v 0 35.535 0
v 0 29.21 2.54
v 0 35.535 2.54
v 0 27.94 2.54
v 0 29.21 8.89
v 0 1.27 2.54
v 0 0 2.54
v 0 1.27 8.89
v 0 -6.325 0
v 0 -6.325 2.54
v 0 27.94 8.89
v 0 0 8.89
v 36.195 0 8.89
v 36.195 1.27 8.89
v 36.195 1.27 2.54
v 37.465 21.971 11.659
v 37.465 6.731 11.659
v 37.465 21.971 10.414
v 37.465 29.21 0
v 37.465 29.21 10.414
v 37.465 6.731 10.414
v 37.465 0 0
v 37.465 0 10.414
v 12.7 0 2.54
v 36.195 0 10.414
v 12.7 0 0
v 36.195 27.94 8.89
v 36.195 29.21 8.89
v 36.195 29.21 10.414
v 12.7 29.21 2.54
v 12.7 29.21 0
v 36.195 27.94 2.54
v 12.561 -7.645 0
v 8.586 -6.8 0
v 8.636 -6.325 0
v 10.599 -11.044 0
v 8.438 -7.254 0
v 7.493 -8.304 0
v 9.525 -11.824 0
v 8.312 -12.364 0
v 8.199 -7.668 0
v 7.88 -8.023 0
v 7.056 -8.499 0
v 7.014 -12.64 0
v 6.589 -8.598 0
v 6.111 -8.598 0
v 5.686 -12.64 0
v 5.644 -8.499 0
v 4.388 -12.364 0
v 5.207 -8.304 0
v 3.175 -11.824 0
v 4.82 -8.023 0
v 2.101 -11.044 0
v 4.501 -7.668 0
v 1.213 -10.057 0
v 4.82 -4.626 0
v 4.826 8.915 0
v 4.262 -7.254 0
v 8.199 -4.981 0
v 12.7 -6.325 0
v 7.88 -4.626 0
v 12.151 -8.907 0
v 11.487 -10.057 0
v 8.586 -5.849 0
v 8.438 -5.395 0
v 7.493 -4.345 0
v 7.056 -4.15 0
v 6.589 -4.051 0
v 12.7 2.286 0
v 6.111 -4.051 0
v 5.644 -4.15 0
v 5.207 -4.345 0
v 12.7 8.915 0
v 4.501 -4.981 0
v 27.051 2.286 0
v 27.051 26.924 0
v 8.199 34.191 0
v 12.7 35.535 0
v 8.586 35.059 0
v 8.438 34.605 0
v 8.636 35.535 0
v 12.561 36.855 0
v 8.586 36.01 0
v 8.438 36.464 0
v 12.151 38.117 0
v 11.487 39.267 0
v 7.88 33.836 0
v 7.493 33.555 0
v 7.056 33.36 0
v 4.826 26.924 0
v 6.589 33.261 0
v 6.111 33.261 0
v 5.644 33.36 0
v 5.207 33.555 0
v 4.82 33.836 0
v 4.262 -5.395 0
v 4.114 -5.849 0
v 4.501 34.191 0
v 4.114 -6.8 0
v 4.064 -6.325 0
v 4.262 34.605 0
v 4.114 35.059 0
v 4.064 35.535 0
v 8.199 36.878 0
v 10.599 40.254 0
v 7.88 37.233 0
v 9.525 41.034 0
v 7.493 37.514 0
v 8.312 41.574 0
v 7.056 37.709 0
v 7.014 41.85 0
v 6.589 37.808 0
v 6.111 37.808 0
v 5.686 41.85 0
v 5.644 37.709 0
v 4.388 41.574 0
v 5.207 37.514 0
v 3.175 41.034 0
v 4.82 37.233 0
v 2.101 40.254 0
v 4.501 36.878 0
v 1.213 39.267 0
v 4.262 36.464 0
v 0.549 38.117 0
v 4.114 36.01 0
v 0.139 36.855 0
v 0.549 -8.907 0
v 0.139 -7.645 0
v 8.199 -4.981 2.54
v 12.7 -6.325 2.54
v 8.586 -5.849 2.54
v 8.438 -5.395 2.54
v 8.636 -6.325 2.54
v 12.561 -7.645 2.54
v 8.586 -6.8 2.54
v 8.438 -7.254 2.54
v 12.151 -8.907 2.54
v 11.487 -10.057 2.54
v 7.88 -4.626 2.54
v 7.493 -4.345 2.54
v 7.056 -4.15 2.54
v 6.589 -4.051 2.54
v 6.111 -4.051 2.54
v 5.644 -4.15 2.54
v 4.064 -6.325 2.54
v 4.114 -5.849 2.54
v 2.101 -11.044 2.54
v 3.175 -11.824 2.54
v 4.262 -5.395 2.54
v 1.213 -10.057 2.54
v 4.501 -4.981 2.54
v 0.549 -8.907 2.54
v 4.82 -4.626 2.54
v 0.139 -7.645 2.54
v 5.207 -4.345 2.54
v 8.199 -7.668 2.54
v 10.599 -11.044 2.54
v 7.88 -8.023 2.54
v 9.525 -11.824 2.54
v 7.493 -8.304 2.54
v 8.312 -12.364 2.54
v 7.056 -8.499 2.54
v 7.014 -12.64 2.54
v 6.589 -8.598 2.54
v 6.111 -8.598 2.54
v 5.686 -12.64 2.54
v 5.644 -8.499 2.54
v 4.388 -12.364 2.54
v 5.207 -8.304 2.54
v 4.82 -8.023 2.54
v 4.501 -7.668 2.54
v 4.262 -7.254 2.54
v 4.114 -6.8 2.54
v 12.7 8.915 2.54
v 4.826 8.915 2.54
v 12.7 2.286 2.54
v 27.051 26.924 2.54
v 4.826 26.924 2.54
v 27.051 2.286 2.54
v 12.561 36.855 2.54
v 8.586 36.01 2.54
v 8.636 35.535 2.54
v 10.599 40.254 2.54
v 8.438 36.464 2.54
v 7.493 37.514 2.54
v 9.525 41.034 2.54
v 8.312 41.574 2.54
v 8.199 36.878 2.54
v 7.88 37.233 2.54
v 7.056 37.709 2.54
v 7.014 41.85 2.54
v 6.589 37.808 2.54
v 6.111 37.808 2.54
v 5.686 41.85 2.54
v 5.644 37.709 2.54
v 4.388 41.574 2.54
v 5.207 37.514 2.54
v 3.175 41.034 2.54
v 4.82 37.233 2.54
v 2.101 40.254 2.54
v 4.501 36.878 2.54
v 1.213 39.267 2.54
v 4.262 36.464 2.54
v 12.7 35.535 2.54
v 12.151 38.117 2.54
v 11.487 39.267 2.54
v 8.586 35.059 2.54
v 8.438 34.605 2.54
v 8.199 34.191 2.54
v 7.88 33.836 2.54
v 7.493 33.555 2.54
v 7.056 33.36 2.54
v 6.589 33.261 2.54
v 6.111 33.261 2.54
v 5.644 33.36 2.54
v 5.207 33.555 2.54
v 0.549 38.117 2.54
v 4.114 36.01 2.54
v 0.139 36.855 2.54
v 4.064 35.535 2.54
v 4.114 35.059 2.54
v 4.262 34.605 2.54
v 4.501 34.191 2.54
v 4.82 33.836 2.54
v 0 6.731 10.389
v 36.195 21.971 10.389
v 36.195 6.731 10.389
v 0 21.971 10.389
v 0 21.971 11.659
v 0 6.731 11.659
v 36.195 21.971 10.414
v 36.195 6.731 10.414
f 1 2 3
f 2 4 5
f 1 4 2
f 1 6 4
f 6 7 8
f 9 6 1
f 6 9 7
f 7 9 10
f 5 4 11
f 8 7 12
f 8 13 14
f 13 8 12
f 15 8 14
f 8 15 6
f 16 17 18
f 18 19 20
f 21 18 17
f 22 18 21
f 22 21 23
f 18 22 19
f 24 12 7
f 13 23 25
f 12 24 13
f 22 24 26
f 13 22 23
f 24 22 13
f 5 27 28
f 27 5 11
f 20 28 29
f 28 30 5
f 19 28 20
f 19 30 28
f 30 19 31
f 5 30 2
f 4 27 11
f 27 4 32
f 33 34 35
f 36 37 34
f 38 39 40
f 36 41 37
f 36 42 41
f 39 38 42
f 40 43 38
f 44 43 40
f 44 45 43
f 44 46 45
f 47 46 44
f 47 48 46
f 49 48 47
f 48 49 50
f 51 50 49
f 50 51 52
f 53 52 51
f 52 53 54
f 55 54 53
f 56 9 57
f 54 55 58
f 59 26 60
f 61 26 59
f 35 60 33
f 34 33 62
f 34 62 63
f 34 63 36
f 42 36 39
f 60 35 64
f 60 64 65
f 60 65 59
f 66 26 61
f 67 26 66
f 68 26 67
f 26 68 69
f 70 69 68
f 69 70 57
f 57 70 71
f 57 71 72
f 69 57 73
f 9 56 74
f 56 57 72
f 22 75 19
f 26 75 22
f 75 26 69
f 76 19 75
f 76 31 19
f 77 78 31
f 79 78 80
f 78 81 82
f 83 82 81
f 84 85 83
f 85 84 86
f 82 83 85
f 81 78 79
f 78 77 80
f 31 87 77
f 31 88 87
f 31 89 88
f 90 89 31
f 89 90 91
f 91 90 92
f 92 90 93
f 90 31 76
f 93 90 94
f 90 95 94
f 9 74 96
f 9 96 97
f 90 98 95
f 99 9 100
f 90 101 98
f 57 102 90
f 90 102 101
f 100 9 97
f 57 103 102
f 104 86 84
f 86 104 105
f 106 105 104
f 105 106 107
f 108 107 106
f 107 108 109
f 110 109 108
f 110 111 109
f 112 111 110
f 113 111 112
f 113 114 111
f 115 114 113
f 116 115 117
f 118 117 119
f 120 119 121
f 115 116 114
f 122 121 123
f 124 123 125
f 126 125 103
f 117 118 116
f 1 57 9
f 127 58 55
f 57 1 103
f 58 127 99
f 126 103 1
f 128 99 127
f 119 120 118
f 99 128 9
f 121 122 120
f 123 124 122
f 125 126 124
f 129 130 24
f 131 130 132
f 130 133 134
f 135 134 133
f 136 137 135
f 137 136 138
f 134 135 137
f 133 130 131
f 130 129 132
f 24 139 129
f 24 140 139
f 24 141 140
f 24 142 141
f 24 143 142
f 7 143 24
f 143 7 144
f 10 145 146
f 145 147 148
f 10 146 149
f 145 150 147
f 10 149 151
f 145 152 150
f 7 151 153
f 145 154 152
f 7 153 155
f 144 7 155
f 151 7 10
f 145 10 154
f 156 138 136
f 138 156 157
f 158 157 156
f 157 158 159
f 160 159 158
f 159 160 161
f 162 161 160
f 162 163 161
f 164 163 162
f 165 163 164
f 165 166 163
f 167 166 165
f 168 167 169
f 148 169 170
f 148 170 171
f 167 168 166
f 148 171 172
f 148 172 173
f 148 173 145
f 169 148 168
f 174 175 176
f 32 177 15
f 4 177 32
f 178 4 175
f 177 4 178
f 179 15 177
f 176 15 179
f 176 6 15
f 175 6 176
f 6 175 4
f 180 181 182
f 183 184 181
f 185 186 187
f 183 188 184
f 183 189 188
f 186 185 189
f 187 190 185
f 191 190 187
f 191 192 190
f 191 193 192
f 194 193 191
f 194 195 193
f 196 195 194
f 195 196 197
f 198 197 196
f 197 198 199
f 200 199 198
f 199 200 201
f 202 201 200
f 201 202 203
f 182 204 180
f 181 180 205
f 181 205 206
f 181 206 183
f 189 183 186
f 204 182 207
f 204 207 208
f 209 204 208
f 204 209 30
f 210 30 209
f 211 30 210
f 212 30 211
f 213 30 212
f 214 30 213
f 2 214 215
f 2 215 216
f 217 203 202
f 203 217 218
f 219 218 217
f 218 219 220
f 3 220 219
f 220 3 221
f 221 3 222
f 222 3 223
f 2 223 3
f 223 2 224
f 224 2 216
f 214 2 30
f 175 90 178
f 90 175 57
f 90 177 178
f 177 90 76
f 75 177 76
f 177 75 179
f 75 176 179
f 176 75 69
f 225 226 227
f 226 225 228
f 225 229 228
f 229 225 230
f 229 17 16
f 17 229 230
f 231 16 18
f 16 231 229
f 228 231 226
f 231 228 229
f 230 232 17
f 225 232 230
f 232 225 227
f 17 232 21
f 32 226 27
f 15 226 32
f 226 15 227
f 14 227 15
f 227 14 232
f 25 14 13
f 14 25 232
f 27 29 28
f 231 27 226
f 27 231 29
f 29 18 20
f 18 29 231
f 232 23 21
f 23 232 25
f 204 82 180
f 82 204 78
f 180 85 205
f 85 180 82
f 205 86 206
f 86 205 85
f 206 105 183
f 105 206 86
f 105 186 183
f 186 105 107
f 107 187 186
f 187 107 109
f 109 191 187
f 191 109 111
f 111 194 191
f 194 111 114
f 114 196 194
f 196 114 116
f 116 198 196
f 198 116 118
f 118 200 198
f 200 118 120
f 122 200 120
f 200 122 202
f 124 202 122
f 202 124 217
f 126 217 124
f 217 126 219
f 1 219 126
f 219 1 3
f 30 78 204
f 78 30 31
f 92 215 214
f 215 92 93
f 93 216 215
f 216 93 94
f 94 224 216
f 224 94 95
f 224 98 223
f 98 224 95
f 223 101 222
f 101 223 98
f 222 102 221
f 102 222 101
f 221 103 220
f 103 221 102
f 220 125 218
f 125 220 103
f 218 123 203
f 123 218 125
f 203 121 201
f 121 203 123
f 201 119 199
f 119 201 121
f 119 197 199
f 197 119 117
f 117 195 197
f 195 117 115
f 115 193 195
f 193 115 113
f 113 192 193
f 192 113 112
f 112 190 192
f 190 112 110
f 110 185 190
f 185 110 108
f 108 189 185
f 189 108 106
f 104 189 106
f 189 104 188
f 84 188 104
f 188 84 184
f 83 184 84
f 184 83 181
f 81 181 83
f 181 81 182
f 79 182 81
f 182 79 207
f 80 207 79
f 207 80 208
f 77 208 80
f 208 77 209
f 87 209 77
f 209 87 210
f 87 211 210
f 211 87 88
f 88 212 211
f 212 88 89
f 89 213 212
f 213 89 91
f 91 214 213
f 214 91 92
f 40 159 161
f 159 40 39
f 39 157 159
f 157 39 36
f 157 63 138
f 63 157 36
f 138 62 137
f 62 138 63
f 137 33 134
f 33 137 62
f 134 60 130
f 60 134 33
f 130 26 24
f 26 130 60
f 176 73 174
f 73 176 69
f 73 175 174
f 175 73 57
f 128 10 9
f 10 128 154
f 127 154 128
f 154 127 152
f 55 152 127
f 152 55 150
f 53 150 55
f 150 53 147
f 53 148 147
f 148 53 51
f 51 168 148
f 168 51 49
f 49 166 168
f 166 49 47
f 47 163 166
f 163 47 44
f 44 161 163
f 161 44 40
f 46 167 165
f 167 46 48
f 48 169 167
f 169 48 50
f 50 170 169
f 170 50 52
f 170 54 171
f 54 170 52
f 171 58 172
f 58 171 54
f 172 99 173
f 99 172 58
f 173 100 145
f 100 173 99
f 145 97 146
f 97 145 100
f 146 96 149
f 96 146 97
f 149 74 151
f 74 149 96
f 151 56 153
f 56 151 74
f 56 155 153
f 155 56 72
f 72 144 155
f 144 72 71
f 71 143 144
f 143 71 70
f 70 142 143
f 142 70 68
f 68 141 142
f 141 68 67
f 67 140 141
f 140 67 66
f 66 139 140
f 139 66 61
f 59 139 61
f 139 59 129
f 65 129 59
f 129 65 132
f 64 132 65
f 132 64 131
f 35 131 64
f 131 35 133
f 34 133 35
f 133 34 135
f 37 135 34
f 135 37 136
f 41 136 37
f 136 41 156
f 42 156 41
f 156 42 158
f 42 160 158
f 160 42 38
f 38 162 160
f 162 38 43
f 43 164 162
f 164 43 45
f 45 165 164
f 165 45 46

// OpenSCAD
// file: ../models/esp8266_d1_min.scad
module model_esp9266_d1_min()
{
    pcbWidth = 1355;
    pcbHeight = 1010;
    color("CornflowerBlue")
    // Main PCB
    linear_extrude(50)
    square([pcbWidth, pcbHeight], center=true);

    // ESP 8266 Carrier
    color("SteelBlue")
    translate([-pcbWidth/2+947/2, 0, 49])
    linear_extrude(36)
    square([947, 630], center=true);

    // ESP8266 Module
    color("SkyBlue")
    translate([-pcbWidth/2+590/2+290, 0, 84])
    linear_extrude(100)
    square([590, 470], center=true);

    // USB Connector under board
    color("SteelBlue")
    translate([pcbWidth/2-220/2, -30, -110])
    linear_extrude(111)
    square([220, 320], center=true);

    // Reset button under board
    color("SteelBlue")
    translate([pcbWidth/2-192/2-50, pcbHeight/2-130/2, -90])
    linear_extrude(91)
    square([192, 130], center=true);

    // USB Serial chip under board
    color("SteelBlue")
    translate([pcbWidth/2-240/2-350, pcbHeight/2-390/2-350, -60])
    linear_extrude(61)
    square([240, 390], center=true);
}
// main file
ViewScale = [0.0254, 0.0254, 0.0254];
include <../models/esp8266_d1_min.scad>

modelcolor=1;
models=1;

pcbWidth = 1355;
pcbHeight = 1010;

module holder()
{
    linear_extrude(100)
    difference() {
        square([pcbWidth+120, pcbHeight+140]);
        translate([190, 90, 0])
        square([pcbWidth-480, pcbHeight-40]);
    }

    translate([0, 0, 99]) {
        linear_extrude(251)
        square([pcbWidth+120, 50]);
        linear_extrude(251)
        translate([0, pcbHeight+90, 0])
        square([pcbWidth+120, 50]);
    }

    // Front
    translate([0, 0, 409])
    linear_extrude(50)
    translate([0, pcbHeight/2+120/2-300])
    square([pcbWidth+120, 600]);

    // End
    translate([pcbWidth+70, 0, 99])
    linear_extrude(311)
    square([50, pcbHeight+140]);

    // Screw mounts
    translate([250, pcbHeight+140+500/2-1, 0])
    linear_extrude(100)
    difference() {
        hull() {
            circle(500/2);
            translate([-250, -300, 0])
            square([500, 300]);
        }
        circle(180/2);
    }
    // Screw mount
    translate([250, -500/2+1, 0])
    linear_extrude(100)
    difference() {
        hull() {
            circle(500/2);
            translate([-250, 300, 0])
            square([500, 300]);
        }
        circle(180/2);
    }


//    difference() {
//
//        square([pcbWidth+120, pcbHeight+140]);
//        translate([0, pcbHeight/2-550/2, 0])
//        square([pcbWidth+120, 550]);
//    }
}

module forViewing()
{
    translate([pcbWidth/2, (pcbHeight/2)+70, 200])
     model_esp9266_d1_min();
     holder();
}

module forPrinting()
{
     holder();
}

scale(ViewScale)
{
    //forViewing()
    forPrinting();
}
